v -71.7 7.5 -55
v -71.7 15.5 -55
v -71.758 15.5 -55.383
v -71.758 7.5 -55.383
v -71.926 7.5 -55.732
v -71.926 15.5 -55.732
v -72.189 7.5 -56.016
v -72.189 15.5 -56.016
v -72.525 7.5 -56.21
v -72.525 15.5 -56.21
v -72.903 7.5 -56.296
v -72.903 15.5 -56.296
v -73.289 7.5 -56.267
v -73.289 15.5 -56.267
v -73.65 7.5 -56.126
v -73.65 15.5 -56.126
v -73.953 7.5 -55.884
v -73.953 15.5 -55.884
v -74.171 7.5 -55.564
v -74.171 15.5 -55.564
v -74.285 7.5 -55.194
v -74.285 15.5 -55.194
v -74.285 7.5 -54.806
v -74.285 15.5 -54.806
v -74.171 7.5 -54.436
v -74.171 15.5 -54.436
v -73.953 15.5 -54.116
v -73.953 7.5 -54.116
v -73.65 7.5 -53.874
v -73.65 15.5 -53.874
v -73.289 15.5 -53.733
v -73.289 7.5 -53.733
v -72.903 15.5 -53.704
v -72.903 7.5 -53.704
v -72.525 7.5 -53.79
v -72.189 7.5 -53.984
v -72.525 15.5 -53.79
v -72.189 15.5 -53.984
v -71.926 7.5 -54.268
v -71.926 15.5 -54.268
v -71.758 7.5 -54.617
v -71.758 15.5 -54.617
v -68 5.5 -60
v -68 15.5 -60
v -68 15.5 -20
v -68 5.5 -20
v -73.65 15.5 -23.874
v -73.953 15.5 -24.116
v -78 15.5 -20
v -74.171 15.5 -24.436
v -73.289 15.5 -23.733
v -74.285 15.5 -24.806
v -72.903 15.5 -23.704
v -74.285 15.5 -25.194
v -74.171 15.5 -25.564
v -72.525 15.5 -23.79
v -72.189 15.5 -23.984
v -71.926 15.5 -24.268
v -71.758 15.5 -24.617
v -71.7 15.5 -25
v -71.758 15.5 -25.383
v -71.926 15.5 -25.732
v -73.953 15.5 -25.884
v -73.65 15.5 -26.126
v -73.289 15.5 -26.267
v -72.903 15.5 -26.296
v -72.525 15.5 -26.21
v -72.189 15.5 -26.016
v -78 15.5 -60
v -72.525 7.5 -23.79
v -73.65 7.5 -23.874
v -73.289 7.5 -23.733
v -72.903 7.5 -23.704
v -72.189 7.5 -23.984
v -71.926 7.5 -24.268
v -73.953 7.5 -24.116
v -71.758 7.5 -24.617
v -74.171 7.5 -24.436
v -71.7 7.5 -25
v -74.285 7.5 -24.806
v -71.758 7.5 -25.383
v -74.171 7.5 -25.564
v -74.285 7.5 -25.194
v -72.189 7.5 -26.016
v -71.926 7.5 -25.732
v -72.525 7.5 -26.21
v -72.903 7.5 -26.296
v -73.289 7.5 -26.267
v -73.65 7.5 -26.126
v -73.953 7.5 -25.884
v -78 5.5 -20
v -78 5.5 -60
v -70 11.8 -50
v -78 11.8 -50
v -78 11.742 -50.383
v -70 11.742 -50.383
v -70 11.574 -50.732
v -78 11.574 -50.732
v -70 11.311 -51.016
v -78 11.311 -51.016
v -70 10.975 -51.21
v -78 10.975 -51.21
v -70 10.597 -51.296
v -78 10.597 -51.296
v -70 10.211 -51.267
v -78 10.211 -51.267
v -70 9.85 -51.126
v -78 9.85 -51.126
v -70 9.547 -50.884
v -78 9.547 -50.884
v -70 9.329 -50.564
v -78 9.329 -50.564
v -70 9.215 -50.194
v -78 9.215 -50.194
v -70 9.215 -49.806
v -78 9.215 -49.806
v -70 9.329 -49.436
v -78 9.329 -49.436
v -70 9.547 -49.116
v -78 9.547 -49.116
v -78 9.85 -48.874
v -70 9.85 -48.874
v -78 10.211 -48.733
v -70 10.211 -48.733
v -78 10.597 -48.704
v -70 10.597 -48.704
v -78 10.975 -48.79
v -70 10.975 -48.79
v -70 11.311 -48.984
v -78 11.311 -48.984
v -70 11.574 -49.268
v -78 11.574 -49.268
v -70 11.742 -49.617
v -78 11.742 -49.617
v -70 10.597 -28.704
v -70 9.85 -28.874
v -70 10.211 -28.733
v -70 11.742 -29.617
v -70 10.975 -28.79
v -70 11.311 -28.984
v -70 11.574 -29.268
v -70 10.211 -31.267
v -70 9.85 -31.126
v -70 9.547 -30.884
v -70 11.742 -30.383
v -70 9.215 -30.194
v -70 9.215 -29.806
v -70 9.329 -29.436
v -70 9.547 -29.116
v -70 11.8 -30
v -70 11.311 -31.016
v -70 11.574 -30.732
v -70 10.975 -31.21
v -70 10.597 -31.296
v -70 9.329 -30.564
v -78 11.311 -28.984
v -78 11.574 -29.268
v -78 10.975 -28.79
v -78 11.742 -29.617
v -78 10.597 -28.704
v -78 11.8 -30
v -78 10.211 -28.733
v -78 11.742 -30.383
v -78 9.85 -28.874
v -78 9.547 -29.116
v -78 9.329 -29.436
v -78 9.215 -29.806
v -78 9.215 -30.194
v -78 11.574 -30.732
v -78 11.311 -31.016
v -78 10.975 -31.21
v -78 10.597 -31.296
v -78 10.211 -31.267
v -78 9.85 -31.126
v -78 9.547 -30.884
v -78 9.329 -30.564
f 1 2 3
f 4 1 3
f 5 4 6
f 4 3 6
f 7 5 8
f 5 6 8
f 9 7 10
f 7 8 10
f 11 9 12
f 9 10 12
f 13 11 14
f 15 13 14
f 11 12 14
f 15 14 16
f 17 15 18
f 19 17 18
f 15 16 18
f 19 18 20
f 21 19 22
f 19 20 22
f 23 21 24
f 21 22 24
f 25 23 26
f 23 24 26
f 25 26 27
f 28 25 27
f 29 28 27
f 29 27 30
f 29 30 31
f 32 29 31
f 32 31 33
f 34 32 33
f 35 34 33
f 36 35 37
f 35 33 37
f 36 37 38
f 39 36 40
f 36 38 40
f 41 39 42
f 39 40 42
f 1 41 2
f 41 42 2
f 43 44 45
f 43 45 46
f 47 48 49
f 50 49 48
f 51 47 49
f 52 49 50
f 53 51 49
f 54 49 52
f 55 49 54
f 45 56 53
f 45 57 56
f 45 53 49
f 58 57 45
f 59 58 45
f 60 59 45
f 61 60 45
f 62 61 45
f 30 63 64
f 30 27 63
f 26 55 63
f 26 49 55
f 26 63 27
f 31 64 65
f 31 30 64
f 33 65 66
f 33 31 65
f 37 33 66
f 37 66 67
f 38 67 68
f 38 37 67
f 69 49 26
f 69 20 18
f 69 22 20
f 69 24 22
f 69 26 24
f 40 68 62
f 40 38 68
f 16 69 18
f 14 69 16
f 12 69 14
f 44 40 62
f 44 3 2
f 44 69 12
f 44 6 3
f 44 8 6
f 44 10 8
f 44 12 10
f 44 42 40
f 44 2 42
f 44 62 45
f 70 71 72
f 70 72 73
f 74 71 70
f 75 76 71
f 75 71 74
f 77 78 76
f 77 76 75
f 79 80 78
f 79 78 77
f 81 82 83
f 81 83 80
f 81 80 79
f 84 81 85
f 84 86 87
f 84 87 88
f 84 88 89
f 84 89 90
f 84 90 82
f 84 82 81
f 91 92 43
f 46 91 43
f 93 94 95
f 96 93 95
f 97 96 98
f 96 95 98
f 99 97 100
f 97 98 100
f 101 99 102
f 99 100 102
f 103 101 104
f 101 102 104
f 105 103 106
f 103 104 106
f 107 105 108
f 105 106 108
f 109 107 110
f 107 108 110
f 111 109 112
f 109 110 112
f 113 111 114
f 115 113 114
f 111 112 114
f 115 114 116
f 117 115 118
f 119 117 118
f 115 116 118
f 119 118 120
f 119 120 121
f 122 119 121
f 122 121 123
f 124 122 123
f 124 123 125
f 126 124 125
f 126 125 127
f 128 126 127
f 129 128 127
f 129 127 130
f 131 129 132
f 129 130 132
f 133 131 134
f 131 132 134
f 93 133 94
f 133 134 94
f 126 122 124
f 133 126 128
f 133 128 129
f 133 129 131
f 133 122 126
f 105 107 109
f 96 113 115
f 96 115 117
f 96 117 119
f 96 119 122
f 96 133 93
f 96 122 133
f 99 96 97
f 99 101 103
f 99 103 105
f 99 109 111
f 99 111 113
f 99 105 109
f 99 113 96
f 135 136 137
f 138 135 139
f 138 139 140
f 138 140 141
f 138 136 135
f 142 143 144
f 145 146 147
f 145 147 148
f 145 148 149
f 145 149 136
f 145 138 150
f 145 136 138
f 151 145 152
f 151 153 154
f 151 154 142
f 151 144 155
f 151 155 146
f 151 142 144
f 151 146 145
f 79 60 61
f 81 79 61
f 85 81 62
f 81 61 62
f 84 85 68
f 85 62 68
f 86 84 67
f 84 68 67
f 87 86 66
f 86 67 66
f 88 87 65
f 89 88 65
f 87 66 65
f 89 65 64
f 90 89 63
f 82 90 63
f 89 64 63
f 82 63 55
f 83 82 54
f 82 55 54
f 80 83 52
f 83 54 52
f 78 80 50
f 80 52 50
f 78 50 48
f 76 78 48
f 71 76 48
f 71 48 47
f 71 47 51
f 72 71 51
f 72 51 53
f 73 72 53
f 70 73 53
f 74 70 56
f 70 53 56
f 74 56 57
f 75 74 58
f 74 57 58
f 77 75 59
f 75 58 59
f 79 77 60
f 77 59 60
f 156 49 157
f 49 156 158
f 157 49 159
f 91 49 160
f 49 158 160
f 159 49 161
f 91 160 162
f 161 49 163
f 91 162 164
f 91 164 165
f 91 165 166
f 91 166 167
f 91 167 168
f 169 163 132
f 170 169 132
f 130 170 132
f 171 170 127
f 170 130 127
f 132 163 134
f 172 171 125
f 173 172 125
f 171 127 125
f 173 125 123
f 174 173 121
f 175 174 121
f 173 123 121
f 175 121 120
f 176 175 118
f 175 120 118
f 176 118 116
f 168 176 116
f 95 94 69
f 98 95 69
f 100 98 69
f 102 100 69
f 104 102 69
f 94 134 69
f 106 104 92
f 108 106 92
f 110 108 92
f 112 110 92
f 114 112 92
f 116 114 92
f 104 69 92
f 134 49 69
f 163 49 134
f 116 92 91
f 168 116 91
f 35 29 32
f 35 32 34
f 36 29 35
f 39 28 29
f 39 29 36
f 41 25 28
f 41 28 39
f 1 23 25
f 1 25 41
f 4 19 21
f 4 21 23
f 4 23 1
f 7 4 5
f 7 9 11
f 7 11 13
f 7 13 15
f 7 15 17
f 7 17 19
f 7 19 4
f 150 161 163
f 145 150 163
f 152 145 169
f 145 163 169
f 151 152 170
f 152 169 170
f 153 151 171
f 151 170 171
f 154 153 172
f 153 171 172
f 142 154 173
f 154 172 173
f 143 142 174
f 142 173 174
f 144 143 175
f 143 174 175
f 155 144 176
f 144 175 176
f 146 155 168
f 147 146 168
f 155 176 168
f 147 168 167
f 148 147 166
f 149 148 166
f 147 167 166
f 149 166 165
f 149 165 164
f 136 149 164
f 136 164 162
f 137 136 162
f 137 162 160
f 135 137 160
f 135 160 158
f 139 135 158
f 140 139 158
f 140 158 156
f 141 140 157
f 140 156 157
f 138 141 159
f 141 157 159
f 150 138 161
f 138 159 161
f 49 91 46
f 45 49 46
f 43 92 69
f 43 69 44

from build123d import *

# Parameters (mm, degrees)
SKETCH052_W     = 10
SKETCH052_H     = 10
PAD027_DEPTH    = 40
SKETCH053_R     = 1.3
POCKET002_DEPTH = 8
SKETCH054_R     = 1.3
POCKET003_DEPTH = 8


with BuildPart() as part:
    # Sketch052 → Pad027 (new body)
    with BuildSketch(Plane(origin=(0, 0, -60), x_dir=(1, 0, 0), z_dir=(0, 0, -1))):
        with Locations((-73, -10.5)):
            Rectangle(SKETCH052_W, SKETCH052_H)
    extrude(amount=-PAD027_DEPTH)

    # Sketch053 → Pocket002 (cut)
    with BuildSketch(Plane(origin=(0, 15.5, -60), x_dir=(1, 0, 0), z_dir=(0, 1, 0))):
        with Locations((-73, -5)):
            Circle(SKETCH053_R)
        with Locations((-73, -35)):
            Circle(SKETCH053_R)
    extrude(amount=-POCKET002_DEPTH, mode=Mode.SUBTRACT)

    # Sketch054 → Pocket003 (cut)
    with BuildSketch(Plane(origin=(-78, 0, -60), x_dir=(0, 1, 0), z_dir=(-1, 0, 0))):
        with Locations((10.5, -10)):
            Circle(SKETCH054_R)
        with Locations((10.5, -30)):
            Circle(SKETCH054_R)
    extrude(amount=-POCKET003_DEPTH, mode=Mode.SUBTRACT)


solid = part.part
